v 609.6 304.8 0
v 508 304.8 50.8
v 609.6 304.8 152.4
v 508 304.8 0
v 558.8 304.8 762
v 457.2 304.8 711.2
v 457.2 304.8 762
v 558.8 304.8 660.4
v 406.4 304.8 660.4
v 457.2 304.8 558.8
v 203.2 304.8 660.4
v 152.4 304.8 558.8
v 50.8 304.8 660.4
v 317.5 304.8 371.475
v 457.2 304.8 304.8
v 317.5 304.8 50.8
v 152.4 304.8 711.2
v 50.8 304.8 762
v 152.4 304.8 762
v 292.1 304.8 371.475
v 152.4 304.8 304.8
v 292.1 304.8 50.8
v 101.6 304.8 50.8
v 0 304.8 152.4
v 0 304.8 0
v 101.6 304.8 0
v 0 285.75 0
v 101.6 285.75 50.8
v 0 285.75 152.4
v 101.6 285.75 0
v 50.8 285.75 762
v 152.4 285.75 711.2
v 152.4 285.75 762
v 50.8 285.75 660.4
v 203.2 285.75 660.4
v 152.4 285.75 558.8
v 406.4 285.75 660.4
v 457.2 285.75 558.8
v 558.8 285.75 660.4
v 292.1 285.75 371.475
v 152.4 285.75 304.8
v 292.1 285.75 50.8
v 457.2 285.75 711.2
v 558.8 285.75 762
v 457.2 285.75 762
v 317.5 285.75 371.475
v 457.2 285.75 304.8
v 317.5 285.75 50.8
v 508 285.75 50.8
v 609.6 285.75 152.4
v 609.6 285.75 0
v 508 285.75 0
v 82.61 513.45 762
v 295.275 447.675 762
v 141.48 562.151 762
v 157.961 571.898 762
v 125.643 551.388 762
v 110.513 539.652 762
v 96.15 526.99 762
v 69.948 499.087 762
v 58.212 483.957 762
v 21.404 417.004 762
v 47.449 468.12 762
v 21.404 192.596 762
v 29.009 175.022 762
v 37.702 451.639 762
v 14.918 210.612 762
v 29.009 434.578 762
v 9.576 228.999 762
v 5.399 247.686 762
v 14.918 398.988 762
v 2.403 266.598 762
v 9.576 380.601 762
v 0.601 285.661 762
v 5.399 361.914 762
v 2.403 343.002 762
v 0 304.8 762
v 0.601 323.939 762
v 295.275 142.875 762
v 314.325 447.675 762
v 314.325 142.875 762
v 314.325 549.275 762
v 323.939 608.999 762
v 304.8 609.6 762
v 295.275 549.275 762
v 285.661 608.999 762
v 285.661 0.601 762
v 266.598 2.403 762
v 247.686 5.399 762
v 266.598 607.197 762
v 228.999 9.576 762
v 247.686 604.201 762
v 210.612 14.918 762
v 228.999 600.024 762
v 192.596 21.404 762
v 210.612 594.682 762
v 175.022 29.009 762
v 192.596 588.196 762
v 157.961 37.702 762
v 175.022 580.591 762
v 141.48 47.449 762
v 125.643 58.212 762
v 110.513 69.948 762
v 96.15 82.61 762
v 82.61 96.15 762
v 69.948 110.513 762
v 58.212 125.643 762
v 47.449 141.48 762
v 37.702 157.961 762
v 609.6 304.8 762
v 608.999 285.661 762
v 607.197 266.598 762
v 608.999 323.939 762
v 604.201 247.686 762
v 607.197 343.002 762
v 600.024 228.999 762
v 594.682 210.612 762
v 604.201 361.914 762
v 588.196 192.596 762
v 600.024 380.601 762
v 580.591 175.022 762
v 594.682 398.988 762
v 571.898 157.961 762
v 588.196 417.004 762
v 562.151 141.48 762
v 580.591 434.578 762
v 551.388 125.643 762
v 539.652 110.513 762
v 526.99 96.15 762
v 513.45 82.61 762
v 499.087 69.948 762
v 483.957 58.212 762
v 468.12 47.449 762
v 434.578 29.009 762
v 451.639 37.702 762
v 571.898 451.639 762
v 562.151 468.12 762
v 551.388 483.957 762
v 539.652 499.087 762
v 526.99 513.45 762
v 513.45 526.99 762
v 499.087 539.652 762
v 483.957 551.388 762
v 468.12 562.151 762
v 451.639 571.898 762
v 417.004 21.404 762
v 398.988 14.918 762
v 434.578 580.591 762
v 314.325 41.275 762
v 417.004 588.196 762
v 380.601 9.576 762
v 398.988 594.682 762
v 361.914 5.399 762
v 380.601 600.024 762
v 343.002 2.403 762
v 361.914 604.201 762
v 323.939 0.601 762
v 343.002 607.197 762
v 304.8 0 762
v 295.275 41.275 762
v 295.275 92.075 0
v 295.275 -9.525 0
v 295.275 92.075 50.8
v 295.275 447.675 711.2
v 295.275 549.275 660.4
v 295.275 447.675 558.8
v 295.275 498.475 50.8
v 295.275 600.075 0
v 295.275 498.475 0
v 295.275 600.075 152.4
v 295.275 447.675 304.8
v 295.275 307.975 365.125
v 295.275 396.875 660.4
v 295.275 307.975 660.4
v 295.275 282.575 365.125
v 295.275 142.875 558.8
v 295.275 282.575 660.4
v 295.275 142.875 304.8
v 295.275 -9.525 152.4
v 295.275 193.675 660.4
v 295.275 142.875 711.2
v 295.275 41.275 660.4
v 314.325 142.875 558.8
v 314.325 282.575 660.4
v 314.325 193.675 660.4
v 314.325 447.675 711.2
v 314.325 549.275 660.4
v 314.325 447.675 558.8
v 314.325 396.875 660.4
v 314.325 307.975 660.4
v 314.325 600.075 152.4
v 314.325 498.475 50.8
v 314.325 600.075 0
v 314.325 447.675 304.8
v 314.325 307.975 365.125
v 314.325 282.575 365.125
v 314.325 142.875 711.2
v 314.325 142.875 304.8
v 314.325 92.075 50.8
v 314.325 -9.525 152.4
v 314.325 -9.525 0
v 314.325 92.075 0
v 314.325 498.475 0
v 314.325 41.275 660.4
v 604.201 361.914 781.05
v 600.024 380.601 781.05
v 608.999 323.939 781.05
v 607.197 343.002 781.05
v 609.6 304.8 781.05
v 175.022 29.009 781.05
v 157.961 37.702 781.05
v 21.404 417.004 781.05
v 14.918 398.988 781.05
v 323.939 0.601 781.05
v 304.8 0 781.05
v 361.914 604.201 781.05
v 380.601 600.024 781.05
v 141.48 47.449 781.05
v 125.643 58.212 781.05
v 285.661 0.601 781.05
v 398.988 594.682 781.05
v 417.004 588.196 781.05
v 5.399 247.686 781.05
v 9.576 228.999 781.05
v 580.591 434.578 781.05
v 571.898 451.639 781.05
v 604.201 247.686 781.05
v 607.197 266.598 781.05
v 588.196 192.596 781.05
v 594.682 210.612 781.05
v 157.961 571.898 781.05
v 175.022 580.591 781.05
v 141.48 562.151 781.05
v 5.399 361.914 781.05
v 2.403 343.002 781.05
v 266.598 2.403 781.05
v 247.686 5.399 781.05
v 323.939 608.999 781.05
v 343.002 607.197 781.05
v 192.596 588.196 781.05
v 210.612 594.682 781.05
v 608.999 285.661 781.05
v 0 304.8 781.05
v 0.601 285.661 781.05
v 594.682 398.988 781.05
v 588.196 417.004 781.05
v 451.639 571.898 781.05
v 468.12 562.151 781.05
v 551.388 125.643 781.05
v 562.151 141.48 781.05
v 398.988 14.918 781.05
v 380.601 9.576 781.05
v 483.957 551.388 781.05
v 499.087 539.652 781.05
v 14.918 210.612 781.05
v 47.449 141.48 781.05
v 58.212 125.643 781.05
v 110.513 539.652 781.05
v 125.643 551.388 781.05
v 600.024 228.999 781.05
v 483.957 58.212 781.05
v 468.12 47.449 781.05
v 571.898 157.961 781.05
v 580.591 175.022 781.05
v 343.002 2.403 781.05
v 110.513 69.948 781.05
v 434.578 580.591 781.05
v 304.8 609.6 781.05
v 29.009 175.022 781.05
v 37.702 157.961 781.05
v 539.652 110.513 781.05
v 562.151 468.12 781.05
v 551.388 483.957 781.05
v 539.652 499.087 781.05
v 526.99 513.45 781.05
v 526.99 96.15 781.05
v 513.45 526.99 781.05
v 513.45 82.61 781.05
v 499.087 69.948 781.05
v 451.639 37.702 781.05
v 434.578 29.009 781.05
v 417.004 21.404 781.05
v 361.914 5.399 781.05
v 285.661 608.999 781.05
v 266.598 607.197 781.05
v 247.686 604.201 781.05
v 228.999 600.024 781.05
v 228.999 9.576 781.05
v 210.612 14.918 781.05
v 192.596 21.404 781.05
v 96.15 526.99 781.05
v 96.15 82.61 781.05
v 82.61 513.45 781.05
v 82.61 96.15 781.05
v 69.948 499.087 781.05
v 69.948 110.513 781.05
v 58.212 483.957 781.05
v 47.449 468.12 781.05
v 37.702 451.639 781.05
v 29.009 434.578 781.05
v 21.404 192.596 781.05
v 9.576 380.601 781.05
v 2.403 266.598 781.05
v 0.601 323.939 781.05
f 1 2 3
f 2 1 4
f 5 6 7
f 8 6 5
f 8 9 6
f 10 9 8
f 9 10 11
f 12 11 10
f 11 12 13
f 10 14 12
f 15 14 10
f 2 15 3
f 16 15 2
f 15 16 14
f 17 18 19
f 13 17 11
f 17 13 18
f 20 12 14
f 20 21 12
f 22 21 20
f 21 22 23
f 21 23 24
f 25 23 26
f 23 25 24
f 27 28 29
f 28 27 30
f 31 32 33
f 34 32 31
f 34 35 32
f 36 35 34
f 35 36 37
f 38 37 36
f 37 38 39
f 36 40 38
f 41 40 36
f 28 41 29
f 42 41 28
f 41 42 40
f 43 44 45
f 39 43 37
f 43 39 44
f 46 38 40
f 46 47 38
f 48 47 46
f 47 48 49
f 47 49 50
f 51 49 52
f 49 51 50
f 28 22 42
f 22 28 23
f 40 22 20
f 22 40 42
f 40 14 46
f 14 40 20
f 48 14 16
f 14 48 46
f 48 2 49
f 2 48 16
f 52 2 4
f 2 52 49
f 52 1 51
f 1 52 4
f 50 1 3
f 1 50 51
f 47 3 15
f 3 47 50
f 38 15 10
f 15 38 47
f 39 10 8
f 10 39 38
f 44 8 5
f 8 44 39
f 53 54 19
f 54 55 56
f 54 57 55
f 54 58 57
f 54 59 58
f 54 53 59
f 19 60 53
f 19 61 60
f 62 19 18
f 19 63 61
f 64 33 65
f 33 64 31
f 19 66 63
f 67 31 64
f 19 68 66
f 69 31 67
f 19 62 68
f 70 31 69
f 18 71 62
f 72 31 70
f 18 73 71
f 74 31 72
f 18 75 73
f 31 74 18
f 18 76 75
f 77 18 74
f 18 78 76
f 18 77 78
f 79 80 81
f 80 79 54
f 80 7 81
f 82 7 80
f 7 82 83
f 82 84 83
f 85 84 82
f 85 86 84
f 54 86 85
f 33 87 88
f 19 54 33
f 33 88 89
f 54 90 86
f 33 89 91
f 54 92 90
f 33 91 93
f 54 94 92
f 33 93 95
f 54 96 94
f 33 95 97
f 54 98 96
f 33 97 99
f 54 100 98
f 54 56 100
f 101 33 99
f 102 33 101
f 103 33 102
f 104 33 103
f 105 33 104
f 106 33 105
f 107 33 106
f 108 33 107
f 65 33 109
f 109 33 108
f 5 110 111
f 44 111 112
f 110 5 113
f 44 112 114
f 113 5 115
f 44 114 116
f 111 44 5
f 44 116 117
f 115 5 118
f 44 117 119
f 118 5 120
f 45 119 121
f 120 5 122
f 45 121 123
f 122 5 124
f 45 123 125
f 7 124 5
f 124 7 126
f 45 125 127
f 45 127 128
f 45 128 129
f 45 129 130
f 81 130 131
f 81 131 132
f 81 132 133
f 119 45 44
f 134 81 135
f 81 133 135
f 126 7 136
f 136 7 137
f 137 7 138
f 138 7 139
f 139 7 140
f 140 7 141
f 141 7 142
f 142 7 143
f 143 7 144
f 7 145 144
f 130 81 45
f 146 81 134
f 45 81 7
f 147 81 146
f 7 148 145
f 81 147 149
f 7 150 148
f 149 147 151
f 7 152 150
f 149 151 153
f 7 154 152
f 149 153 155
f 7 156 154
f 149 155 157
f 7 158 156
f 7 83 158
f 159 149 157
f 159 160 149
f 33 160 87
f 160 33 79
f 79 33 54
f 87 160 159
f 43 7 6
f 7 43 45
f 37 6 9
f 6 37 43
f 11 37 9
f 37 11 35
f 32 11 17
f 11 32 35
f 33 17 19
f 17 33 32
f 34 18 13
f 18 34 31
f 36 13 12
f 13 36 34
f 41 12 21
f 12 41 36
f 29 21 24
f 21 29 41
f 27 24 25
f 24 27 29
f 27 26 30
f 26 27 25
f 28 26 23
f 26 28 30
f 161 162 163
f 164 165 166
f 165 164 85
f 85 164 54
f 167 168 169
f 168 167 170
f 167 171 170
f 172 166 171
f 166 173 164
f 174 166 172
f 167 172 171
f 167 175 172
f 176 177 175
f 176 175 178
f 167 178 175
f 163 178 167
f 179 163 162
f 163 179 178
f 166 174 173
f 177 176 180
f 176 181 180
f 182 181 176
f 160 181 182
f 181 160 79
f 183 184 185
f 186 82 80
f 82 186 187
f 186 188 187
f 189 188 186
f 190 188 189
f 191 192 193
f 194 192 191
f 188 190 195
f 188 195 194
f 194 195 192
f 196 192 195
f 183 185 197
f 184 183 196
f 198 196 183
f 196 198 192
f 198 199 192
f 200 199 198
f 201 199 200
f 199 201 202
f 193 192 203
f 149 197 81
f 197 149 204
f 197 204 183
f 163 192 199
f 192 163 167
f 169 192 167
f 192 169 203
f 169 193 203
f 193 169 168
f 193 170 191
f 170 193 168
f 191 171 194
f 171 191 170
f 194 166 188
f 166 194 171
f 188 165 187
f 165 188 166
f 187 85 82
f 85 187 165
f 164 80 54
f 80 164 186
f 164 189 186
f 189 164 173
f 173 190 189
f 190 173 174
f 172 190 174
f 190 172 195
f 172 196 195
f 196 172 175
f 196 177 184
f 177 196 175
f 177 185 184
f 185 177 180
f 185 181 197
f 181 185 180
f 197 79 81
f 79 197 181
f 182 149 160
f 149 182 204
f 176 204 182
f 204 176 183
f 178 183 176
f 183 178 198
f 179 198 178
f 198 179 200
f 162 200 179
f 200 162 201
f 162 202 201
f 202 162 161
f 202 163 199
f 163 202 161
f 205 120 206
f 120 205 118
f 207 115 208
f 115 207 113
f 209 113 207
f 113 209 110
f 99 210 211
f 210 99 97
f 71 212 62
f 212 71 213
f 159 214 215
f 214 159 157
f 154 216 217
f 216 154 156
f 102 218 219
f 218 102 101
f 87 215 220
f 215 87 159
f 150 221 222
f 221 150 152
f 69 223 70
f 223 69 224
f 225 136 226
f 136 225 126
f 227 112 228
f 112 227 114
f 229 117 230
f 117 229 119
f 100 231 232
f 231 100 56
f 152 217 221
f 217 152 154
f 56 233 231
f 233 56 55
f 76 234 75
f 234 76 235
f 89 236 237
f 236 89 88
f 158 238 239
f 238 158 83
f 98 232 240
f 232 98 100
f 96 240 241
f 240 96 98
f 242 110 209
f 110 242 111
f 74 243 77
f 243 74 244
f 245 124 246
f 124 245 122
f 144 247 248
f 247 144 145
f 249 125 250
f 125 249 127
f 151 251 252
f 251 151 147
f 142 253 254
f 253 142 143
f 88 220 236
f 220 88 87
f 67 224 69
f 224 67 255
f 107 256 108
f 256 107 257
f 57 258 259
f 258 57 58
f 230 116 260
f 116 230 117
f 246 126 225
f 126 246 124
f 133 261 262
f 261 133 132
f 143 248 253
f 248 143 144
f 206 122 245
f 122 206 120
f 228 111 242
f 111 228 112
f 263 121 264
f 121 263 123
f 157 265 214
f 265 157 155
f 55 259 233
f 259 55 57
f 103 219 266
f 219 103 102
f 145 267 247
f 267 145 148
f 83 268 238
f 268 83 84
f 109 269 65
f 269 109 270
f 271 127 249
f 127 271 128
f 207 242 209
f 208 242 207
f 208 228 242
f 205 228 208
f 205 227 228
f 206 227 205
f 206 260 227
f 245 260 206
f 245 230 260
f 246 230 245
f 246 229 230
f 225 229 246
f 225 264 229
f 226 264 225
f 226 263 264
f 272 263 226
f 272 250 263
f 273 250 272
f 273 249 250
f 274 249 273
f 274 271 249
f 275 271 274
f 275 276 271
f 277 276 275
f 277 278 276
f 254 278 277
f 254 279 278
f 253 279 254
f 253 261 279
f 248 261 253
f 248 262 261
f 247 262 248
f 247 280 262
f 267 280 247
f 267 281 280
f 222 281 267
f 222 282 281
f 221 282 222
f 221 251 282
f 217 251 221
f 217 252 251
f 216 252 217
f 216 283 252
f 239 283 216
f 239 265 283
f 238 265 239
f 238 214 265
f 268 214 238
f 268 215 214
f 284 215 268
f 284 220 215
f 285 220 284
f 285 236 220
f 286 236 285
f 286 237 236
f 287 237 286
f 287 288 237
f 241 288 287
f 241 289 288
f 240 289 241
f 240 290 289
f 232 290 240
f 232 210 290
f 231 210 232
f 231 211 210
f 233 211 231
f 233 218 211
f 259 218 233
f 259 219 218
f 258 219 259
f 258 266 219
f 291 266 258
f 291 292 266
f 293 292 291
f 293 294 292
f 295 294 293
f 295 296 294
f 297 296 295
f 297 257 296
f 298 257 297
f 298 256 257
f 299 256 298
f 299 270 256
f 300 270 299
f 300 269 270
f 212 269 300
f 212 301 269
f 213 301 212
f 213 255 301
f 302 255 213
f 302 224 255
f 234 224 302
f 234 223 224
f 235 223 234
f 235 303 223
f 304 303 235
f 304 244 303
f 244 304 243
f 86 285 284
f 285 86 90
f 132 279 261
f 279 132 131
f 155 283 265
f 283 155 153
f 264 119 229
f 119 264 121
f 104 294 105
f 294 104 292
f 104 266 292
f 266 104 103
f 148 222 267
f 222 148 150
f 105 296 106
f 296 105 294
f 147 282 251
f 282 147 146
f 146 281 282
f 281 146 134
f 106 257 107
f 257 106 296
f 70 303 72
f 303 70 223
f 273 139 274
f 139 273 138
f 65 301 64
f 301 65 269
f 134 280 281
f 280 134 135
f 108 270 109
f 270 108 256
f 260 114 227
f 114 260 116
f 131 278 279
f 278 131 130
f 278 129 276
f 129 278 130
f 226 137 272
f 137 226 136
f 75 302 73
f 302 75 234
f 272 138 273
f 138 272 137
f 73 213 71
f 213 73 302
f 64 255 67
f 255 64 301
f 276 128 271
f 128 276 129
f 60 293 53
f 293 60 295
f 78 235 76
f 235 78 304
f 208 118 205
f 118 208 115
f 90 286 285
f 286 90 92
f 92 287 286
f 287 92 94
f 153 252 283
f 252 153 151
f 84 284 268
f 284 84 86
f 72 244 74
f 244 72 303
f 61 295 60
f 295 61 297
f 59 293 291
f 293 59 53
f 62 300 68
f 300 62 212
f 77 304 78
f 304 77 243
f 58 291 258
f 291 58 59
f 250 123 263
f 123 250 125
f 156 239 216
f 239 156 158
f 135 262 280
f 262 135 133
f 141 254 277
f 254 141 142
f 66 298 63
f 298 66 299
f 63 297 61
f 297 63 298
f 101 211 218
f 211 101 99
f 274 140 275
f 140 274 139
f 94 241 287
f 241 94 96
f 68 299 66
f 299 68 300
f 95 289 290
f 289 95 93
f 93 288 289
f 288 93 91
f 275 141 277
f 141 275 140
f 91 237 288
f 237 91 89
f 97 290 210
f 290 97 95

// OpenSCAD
tq = inches(3/4);

color("white") translate([0,0,inches(30)]) {
  *cube([inches(24),inches(24),tq]);
  translate([inches(12),inches(12)]) cylinder(d=inches(24),h=tq,$fn=100);
}
translate([inches(12),inches(12)-tq/2]) union() {
  for(r=[0,90]) color(r==0?"red":"blue") rotate([0,0,r]) translate([-inches(6),tq/2]) rotate([90,0]) linear_extrude(tq) {
      difference() {
      translate([inches(-6),0]) polygon([
        [inches(4),inches(2)],
        [inches(4),0],
        [inches(0),0],
        [inches(0),inches(6)],
        [inches(6),inches(12)],
        [inches(6),inches(22)],
        [inches(2),inches(26)],
        [inches(2),inches(30)],
        [inches(6),inches(30)],
        [inches(6),inches(28)],
        [inches(8),inches(26)],
        [inches(16),inches(26)],
        [inches(18),inches(28)],
        [inches(18),inches(30)],
        [inches(22),inches(30)],
        [inches(22),inches(26)],
        [inches(18),inches(22)],
        [inches(18),inches(12)],
        [inches(24),inches(6)],
        [inches(24),0],
        [inches(20),0],
        [inches(20),inches(2)]]);
        translate([inches(6)-inches(.5),(r/90)*((inches(30)-tq)/2-inches(.25))]) square([inches(1),(inches(30)-tq)/2]);
      }
    }
}
*translate([inches(12)-tq/2,inches(6)]) cube([tq,inches(12),inches(30)-tq]);

module mirrorx(off=0) {
  translate([off/2,0]) for(m=[0,1]) mirror([m,0]) translate([off/-2,0]) children();
}
module mirrory(off=0) {
  translate([0,off/2]) for(m=[0,1]) mirror([0,m]) translate([0,off/-2]) children();
}
function inches(in) = in * 25.4;
